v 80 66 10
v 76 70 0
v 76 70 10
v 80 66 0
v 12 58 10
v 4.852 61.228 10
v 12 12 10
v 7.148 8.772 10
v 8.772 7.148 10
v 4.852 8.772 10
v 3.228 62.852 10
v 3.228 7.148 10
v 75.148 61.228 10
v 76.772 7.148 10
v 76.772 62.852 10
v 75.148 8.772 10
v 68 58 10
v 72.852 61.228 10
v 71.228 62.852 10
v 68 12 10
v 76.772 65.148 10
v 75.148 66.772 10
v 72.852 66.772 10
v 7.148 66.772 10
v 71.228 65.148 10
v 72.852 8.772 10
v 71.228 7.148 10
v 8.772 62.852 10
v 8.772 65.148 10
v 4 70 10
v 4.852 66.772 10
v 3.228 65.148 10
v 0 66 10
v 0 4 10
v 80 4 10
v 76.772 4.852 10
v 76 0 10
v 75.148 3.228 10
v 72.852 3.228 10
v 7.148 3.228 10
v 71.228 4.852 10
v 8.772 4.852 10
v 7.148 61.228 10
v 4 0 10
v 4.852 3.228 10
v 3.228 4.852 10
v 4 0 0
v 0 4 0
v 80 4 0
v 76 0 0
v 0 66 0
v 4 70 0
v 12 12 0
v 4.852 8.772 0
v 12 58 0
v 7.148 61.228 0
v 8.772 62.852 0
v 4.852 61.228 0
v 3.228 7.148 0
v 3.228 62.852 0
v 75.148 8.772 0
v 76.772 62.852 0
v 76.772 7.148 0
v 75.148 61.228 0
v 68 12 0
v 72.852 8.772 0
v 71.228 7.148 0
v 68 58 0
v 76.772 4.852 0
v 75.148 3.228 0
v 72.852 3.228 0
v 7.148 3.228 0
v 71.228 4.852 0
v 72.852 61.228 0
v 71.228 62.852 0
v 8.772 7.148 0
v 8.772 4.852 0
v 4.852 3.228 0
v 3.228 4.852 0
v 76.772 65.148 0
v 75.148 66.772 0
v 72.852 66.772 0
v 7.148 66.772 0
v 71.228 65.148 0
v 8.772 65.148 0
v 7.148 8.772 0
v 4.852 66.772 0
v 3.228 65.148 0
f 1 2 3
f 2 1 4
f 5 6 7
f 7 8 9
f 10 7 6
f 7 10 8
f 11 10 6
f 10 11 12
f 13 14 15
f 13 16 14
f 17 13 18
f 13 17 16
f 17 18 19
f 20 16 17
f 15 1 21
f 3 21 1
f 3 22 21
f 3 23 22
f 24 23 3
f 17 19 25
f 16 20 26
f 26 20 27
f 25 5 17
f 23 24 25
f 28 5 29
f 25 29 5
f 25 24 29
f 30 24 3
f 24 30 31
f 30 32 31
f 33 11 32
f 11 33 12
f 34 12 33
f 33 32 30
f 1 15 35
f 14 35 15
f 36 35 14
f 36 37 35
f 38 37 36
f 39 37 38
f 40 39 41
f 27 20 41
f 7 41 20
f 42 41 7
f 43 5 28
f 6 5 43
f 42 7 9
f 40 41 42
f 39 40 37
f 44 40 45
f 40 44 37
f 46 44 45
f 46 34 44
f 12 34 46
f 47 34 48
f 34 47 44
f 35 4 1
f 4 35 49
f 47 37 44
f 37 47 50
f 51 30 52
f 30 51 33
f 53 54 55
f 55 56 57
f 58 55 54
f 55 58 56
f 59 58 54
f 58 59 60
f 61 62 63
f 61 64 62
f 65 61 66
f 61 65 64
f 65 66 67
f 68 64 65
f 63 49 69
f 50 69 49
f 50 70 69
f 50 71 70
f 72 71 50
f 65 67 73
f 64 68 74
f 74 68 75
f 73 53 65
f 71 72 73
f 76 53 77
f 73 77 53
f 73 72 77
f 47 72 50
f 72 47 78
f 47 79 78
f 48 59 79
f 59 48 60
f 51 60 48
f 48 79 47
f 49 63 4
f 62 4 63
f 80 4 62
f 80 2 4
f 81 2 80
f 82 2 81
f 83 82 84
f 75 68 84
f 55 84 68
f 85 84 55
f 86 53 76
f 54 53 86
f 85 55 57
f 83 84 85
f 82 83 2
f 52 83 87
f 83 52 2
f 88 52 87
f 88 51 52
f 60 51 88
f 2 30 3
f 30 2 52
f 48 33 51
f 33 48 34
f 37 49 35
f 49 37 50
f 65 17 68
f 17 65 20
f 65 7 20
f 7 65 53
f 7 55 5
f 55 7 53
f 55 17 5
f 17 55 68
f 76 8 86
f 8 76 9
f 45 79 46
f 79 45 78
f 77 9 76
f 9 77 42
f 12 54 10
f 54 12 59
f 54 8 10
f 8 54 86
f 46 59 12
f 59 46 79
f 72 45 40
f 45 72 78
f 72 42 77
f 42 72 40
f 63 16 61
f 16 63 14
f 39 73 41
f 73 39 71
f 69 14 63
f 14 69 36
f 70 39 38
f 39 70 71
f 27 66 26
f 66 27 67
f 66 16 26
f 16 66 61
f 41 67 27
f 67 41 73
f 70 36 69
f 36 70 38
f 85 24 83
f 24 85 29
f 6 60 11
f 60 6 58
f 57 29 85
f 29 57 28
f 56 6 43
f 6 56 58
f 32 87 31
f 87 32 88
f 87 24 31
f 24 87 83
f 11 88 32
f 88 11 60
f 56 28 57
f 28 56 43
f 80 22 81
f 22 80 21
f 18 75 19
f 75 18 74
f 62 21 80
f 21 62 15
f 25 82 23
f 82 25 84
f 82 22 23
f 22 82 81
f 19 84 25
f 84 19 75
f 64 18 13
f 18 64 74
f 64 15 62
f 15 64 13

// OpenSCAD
$fn = 32;

// ----------------------------------------------------------------------
// Frame plate: 80 x 70 frame, 12 mm rails
// ----------------------------------------------------------------------

// --- parameters (mm) ---
plate_l = 80;             // plate length, X
plate_w = 70;             // plate width, Y
plate_t = 10;             // plate thickness, Z (extrusion height)
corner_c = 4;             // corner chamfer
frame_bar = 12;           // frame rail width
bolt_r = 3;               // corner bolt window radius
bolt_inset = 6;           // bolt centre inset from the edges

win_l = plate_l - 2 * frame_bar;  // window length
win_w = plate_w - 2 * frame_bar;  // window width
bolt_d = 2 * bolt_r;  // corner hole diameter

profile = [[4, 0], [76, 0], [80, 4], [80, 66], [76, 70], [4, 70], [0, 66], [0, 4]];  // primary outline, 8 points, counter clockwise
void_1 = [[12, 12], [68, 12], [68, 58], [12, 58]];  // the window, 4 points
void_2 = [[8.772, 7.148], [7.148, 8.772], [4.852, 8.772], [3.228, 7.148], [3.228, 4.852], [4.852, 3.228], [7.148, 3.228], [8.772, 4.852]];  // corner bolt window, 8 points
void_3 = [[76.772, 7.148], [75.148, 8.772], [72.852, 8.772], [71.228, 7.148], [71.228, 4.852], [72.852, 3.228], [75.148, 3.228], [76.772, 4.852]];  // corner bolt window, 8 points
void_4 = [[8.772, 65.148], [7.148, 66.772], [4.852, 66.772], [3.228, 65.148], [3.228, 62.852], [4.852, 61.228], [7.148, 61.228], [8.772, 62.852]];  // corner bolt window, 8 points
void_5 = [[76.772, 65.148], [75.148, 66.772], [72.852, 66.772], [71.228, 65.148], [71.228, 62.852], [72.852, 61.228], [75.148, 61.228], [76.772, 62.852]];  // corner bolt window, 8 points

// --- the one profile operation ---
difference() {
  linear_extrude(height = plate_t) polygon(points = profile);
  translate([0, 0, -1])
    linear_extrude(height = plate_t + 2) polygon(points = void_1);
  translate([0, 0, -1])
    linear_extrude(height = plate_t + 2) polygon(points = void_2);
  translate([0, 0, -1])
    linear_extrude(height = plate_t + 2) polygon(points = void_3);
  translate([0, 0, -1])
    linear_extrude(height = plate_t + 2) polygon(points = void_4);
  translate([0, 0, -1])
    linear_extrude(height = plate_t + 2) polygon(points = void_5);
}
